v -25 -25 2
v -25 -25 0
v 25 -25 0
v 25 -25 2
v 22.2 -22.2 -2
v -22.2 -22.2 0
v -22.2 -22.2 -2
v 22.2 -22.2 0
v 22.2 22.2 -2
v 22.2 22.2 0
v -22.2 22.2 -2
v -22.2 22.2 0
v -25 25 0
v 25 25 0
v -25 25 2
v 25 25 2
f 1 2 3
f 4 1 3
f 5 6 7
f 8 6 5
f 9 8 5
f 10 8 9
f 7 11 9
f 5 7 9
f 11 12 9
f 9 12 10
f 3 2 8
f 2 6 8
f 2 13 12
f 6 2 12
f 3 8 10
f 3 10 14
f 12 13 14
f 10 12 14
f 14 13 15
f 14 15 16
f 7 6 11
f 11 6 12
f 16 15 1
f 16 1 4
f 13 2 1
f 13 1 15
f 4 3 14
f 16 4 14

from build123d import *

# Parameters (mm, degrees)
F0_W     = 44.4
F0_H     = 44.4
F1_DEPTH = 2
F0_W_2   = 50
F0_H_2   = 50
F2_DEPTH = 2


with BuildPart() as f1:
    # F0 (on Top) → F1 (new body)
    with BuildSketch(Plane.XY):
        Rectangle(F0_W, F0_H)
    extrude(amount=-F1_DEPTH)

    # F0 (on Top) → F2 (join)
    with BuildSketch(Plane.XY):
        Rectangle(F0_W_2, F0_H_2)
        Rectangle(F0_W, F0_H, mode=Mode.SUBTRACT)
        Rectangle(F0_W, F0_H)
    extrude(amount=F2_DEPTH)


solid = f1.part
